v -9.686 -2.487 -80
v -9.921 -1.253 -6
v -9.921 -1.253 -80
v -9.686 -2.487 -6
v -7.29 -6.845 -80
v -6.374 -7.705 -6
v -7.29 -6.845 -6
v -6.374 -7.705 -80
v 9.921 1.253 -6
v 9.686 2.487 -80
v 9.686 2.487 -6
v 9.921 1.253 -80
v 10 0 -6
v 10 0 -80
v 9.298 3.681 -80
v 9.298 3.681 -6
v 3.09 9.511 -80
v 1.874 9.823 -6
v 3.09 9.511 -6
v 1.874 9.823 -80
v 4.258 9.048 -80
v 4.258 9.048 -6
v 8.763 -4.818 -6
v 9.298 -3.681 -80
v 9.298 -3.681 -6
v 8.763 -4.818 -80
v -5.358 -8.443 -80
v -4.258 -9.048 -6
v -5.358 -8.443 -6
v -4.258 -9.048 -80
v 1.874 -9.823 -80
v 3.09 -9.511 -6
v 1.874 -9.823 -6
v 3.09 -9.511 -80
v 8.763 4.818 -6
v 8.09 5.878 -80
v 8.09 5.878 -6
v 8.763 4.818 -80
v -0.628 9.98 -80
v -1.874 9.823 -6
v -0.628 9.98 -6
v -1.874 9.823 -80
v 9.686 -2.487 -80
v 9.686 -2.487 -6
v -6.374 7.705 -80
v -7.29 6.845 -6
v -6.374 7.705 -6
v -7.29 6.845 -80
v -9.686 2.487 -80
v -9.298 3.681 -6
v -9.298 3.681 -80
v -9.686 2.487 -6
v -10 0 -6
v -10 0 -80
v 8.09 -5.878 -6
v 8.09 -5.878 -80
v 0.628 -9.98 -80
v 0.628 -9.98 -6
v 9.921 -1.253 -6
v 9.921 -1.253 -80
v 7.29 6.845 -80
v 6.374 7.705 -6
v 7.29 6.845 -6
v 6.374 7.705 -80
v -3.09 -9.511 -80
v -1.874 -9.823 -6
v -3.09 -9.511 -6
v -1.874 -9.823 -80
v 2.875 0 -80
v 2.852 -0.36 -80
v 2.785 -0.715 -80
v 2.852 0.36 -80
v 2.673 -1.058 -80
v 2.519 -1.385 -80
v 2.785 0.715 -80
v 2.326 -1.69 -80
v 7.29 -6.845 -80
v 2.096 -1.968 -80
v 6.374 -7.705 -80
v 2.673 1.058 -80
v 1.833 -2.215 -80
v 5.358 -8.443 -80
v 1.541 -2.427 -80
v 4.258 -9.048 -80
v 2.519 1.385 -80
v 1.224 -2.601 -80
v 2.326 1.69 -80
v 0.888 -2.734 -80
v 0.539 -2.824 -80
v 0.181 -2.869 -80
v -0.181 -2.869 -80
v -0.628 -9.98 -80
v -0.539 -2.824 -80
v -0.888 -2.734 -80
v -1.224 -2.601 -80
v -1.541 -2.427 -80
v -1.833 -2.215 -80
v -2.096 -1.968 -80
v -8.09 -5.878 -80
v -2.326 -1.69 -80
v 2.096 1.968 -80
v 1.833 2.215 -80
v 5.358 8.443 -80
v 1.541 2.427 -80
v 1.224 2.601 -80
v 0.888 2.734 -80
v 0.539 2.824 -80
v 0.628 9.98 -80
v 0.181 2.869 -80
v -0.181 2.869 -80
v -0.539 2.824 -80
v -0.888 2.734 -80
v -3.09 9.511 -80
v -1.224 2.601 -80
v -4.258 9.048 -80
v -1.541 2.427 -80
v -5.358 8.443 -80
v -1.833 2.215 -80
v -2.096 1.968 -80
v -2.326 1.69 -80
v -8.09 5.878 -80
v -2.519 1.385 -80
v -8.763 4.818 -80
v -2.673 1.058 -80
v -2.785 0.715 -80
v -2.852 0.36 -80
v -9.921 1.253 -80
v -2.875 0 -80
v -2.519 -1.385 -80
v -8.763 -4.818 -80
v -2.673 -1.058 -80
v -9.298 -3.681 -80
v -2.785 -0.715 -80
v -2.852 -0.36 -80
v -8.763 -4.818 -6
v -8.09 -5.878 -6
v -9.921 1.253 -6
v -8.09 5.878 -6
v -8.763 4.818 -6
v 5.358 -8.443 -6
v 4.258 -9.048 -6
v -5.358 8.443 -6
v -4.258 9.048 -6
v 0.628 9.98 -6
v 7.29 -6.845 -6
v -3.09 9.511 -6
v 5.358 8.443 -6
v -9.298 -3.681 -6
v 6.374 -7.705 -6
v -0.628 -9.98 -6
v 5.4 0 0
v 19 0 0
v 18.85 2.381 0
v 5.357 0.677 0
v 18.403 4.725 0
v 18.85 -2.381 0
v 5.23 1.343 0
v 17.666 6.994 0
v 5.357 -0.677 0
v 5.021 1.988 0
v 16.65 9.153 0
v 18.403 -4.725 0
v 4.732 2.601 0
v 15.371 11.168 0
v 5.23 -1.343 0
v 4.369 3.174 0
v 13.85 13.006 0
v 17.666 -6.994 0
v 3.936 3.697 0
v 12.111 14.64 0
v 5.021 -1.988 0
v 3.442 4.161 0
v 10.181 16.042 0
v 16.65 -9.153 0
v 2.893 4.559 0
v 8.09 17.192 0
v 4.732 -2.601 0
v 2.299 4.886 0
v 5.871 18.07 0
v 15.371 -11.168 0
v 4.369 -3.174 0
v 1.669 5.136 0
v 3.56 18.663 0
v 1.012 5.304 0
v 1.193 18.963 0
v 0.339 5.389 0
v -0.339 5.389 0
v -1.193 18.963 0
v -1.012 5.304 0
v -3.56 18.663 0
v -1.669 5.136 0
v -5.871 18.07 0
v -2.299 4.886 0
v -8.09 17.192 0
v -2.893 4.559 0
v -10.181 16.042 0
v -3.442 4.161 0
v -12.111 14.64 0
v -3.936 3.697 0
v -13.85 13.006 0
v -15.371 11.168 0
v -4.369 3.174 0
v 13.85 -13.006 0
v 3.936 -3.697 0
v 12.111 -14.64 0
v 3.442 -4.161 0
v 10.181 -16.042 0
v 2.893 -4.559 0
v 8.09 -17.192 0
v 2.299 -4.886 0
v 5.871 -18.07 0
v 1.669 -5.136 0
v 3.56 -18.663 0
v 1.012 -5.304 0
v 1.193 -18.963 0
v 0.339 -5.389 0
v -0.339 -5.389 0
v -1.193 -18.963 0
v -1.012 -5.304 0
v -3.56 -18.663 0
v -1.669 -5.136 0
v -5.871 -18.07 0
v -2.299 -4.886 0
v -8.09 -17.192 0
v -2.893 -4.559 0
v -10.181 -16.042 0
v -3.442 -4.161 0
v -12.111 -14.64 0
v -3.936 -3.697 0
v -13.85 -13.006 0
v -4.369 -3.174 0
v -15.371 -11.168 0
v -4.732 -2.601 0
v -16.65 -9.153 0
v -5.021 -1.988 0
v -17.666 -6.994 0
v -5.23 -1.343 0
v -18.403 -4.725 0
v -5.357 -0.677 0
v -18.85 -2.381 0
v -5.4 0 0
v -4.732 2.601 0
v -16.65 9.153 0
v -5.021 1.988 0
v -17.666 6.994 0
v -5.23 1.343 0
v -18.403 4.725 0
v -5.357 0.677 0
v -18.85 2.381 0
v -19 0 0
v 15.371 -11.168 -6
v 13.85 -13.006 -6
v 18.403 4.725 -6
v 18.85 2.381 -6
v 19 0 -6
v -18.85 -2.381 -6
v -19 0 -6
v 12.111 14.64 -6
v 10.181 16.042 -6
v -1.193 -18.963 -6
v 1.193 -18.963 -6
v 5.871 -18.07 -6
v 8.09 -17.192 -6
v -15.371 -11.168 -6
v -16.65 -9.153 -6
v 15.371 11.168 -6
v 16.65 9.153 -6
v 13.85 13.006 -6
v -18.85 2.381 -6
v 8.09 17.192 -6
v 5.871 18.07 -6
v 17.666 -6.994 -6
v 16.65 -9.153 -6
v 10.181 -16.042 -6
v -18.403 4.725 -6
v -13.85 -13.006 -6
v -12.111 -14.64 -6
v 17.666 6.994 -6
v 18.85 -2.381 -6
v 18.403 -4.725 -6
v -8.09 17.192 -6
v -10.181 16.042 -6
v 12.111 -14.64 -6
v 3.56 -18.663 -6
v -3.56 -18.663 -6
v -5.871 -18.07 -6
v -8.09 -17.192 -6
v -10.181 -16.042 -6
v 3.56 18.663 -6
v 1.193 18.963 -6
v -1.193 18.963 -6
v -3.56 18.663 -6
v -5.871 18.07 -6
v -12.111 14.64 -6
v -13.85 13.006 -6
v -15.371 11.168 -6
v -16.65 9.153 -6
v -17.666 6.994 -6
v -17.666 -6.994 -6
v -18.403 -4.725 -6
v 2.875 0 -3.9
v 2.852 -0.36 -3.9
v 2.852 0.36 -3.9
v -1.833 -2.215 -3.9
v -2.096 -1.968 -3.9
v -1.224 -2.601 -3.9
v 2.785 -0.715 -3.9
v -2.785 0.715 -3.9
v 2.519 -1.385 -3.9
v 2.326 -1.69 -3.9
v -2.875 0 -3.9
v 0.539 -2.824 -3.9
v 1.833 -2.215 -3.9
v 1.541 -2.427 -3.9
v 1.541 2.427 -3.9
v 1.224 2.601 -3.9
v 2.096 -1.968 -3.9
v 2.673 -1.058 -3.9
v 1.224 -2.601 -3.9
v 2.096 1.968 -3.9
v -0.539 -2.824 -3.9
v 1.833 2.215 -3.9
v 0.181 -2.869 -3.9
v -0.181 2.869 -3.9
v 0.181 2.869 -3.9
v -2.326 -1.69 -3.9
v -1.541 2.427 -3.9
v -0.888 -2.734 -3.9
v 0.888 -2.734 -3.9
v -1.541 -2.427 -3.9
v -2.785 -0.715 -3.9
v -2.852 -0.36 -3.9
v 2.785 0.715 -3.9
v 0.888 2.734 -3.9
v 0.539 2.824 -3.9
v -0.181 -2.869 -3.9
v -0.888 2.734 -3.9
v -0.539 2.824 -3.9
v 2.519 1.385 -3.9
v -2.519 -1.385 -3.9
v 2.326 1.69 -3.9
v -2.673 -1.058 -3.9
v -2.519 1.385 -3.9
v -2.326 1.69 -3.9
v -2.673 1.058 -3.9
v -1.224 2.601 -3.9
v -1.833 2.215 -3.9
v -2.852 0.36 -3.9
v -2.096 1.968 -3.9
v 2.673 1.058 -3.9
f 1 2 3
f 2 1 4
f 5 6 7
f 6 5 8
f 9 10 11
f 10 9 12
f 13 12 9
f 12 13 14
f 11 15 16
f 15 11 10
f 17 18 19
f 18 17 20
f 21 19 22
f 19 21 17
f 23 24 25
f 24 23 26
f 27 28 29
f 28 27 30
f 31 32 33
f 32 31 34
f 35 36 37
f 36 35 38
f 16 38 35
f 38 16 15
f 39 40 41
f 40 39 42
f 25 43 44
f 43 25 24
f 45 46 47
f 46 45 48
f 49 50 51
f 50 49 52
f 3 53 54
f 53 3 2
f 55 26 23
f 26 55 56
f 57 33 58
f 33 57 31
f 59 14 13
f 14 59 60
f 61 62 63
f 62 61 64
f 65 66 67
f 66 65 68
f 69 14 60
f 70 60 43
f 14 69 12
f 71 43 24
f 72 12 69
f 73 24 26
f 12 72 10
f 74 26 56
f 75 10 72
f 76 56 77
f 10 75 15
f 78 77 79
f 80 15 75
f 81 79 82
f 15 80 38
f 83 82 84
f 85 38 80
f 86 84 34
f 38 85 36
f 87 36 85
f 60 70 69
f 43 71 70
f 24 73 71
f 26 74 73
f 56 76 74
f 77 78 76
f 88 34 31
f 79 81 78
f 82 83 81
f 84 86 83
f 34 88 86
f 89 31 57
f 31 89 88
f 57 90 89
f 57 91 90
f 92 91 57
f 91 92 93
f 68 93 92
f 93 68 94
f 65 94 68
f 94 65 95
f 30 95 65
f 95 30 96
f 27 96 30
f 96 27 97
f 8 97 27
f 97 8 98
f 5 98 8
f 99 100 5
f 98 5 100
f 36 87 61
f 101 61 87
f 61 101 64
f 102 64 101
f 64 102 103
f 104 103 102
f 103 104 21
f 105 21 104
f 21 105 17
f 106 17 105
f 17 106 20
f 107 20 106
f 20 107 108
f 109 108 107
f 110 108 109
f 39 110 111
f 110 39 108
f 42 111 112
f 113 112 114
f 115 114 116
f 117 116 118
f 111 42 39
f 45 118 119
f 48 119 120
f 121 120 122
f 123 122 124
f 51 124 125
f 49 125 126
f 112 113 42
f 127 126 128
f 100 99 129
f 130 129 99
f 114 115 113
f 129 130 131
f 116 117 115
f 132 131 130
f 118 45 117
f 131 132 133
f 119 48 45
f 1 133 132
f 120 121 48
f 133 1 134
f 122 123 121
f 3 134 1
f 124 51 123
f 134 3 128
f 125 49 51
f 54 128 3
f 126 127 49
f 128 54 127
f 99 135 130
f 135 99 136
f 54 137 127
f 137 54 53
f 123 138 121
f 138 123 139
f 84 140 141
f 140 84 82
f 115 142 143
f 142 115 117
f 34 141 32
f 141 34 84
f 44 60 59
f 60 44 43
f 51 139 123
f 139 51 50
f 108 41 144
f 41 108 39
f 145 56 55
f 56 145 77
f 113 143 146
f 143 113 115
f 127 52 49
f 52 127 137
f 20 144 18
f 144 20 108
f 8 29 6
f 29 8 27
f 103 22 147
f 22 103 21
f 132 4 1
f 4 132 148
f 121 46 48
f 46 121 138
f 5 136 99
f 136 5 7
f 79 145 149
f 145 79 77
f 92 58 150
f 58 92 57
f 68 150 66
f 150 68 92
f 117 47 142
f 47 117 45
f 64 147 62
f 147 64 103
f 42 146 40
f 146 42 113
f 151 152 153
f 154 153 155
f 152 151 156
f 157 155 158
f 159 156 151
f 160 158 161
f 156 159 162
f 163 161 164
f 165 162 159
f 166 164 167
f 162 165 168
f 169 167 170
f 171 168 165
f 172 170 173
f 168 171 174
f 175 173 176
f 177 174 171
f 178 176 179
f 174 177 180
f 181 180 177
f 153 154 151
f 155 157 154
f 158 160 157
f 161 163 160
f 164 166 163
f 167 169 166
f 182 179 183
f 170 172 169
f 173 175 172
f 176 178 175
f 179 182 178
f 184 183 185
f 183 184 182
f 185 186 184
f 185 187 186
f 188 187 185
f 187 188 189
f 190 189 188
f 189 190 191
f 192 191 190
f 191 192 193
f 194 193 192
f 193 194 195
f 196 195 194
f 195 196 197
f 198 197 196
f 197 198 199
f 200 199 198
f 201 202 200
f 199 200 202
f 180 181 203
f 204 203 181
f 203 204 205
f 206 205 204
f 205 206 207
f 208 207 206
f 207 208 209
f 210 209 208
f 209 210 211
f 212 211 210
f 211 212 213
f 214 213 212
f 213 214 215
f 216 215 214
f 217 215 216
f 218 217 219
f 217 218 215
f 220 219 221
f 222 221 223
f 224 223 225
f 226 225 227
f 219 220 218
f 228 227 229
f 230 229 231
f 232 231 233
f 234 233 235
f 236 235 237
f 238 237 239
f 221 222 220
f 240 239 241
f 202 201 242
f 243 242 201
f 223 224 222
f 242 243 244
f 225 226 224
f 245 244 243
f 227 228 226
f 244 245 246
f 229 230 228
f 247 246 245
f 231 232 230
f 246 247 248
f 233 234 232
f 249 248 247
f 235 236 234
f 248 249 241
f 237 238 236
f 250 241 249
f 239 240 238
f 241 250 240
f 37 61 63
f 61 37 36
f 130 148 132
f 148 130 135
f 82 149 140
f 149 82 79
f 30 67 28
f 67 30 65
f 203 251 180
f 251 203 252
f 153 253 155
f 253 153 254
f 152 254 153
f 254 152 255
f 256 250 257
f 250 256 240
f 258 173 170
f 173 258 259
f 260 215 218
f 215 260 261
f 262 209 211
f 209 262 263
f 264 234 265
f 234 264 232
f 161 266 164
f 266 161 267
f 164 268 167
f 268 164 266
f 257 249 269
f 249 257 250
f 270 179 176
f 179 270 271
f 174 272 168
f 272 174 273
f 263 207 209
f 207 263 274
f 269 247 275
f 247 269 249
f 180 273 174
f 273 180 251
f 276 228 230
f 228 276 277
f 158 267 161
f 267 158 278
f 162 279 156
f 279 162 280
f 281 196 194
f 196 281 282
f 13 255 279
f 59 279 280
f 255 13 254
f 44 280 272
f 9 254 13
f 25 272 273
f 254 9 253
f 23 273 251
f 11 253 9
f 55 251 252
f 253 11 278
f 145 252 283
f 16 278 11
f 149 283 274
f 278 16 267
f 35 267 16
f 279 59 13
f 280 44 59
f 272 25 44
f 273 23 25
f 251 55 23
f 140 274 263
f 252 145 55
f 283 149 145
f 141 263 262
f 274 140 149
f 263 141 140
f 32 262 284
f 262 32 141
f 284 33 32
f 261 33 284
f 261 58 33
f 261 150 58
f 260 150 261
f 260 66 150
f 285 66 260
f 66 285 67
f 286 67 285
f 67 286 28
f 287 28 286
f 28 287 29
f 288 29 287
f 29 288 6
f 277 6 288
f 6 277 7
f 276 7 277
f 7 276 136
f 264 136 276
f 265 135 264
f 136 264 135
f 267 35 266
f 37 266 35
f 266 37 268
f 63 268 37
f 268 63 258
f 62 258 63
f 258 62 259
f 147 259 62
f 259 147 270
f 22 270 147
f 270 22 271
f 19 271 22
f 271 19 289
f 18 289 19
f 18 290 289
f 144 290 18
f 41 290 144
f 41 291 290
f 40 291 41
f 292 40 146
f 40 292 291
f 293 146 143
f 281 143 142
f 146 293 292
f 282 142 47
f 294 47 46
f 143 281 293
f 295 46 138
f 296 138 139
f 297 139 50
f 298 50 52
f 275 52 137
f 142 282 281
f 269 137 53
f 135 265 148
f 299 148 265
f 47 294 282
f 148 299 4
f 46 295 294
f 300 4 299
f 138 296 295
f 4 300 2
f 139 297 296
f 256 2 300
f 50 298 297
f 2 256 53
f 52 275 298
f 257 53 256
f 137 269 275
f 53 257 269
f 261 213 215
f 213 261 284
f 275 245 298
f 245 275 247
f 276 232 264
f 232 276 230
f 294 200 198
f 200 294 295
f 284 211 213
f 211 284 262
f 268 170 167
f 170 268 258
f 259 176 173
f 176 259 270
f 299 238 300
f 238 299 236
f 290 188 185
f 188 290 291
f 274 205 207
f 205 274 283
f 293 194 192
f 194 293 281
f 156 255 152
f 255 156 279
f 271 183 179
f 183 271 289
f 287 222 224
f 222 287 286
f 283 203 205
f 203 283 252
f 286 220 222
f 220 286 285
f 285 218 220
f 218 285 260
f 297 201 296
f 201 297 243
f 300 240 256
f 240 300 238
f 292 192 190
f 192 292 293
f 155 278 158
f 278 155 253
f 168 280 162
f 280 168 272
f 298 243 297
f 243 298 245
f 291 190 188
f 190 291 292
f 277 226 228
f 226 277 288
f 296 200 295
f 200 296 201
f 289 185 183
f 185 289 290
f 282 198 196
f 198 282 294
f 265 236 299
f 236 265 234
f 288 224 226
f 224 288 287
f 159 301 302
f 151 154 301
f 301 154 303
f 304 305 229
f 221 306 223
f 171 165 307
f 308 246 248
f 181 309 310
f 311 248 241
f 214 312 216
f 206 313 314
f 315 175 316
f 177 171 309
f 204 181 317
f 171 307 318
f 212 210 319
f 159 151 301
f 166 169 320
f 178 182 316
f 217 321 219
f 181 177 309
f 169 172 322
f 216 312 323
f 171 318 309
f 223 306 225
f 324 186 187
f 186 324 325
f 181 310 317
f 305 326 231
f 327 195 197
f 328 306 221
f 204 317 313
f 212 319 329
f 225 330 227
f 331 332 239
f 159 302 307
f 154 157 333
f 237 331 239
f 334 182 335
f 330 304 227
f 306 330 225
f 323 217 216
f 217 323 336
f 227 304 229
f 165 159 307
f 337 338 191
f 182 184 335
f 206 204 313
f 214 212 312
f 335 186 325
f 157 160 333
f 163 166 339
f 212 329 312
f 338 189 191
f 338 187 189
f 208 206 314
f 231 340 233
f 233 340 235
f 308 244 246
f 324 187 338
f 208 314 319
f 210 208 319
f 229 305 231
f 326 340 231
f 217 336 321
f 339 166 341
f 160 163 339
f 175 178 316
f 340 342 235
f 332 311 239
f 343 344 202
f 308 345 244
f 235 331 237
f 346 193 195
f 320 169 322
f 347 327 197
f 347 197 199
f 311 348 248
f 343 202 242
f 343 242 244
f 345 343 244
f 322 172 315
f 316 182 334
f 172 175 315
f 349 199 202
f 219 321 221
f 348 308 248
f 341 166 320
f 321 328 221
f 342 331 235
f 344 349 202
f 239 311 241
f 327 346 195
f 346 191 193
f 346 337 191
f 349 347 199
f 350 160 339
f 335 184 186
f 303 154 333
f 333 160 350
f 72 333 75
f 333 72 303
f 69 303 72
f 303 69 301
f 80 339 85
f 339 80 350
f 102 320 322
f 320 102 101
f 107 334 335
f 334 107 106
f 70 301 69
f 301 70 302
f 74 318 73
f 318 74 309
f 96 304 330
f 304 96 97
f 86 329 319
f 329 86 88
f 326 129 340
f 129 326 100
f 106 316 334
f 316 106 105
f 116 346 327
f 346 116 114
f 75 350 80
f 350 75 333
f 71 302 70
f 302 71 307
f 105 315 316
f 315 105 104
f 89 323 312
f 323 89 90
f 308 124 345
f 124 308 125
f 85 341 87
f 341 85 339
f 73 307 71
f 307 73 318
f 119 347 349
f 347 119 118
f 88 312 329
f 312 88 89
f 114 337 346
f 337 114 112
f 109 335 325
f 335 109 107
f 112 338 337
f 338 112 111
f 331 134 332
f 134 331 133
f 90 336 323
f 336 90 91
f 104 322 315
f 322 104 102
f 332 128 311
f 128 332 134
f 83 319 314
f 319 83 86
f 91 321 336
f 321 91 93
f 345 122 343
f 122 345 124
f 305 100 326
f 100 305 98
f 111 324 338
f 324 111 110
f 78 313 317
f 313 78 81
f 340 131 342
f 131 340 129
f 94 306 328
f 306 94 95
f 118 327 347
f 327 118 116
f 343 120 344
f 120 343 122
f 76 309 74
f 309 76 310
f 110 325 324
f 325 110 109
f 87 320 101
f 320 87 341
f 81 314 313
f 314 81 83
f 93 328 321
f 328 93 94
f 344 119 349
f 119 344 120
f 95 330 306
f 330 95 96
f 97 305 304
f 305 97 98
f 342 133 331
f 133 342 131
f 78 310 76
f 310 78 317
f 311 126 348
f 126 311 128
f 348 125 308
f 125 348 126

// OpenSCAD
$fn = 50;


difference() {
	union() {
		translate(v = [0, 0, -80.0000000000]) {
			cylinder(h = 80, r = 10.0000000000);
		}
		translate(v = [0, 0, -6.0000000000]) {
			cylinder(h = 6, r = 19.0000000000);
		}
	}
	union() {
		translate(v = [0, 0, 0]) {
			rotate(a = [0, 0, 0]) {
				difference() {
					union() {
						#translate(v = [0, 0, -80.0000000000]) {
							cylinder(h = 80, r = 2.6000000000);
						}
						#translate(v = [0, 0, -3.9000000000]) {
							cylinder(h = 3.9000000000, r = 10.0000000000, r1 = 2.8750000000, r2 = 5.4000000000);
						}
						#translate(v = [0, 0, -80.0000000000]) {
							cylinder(h = 80, r = 2.8750000000);
						}
						#translate(v = [0, 0, -80.0000000000]) {
							cylinder(h = 80, r = 2.6000000000);
						}
					}
					union();
				}
			}
		}
	}
}
